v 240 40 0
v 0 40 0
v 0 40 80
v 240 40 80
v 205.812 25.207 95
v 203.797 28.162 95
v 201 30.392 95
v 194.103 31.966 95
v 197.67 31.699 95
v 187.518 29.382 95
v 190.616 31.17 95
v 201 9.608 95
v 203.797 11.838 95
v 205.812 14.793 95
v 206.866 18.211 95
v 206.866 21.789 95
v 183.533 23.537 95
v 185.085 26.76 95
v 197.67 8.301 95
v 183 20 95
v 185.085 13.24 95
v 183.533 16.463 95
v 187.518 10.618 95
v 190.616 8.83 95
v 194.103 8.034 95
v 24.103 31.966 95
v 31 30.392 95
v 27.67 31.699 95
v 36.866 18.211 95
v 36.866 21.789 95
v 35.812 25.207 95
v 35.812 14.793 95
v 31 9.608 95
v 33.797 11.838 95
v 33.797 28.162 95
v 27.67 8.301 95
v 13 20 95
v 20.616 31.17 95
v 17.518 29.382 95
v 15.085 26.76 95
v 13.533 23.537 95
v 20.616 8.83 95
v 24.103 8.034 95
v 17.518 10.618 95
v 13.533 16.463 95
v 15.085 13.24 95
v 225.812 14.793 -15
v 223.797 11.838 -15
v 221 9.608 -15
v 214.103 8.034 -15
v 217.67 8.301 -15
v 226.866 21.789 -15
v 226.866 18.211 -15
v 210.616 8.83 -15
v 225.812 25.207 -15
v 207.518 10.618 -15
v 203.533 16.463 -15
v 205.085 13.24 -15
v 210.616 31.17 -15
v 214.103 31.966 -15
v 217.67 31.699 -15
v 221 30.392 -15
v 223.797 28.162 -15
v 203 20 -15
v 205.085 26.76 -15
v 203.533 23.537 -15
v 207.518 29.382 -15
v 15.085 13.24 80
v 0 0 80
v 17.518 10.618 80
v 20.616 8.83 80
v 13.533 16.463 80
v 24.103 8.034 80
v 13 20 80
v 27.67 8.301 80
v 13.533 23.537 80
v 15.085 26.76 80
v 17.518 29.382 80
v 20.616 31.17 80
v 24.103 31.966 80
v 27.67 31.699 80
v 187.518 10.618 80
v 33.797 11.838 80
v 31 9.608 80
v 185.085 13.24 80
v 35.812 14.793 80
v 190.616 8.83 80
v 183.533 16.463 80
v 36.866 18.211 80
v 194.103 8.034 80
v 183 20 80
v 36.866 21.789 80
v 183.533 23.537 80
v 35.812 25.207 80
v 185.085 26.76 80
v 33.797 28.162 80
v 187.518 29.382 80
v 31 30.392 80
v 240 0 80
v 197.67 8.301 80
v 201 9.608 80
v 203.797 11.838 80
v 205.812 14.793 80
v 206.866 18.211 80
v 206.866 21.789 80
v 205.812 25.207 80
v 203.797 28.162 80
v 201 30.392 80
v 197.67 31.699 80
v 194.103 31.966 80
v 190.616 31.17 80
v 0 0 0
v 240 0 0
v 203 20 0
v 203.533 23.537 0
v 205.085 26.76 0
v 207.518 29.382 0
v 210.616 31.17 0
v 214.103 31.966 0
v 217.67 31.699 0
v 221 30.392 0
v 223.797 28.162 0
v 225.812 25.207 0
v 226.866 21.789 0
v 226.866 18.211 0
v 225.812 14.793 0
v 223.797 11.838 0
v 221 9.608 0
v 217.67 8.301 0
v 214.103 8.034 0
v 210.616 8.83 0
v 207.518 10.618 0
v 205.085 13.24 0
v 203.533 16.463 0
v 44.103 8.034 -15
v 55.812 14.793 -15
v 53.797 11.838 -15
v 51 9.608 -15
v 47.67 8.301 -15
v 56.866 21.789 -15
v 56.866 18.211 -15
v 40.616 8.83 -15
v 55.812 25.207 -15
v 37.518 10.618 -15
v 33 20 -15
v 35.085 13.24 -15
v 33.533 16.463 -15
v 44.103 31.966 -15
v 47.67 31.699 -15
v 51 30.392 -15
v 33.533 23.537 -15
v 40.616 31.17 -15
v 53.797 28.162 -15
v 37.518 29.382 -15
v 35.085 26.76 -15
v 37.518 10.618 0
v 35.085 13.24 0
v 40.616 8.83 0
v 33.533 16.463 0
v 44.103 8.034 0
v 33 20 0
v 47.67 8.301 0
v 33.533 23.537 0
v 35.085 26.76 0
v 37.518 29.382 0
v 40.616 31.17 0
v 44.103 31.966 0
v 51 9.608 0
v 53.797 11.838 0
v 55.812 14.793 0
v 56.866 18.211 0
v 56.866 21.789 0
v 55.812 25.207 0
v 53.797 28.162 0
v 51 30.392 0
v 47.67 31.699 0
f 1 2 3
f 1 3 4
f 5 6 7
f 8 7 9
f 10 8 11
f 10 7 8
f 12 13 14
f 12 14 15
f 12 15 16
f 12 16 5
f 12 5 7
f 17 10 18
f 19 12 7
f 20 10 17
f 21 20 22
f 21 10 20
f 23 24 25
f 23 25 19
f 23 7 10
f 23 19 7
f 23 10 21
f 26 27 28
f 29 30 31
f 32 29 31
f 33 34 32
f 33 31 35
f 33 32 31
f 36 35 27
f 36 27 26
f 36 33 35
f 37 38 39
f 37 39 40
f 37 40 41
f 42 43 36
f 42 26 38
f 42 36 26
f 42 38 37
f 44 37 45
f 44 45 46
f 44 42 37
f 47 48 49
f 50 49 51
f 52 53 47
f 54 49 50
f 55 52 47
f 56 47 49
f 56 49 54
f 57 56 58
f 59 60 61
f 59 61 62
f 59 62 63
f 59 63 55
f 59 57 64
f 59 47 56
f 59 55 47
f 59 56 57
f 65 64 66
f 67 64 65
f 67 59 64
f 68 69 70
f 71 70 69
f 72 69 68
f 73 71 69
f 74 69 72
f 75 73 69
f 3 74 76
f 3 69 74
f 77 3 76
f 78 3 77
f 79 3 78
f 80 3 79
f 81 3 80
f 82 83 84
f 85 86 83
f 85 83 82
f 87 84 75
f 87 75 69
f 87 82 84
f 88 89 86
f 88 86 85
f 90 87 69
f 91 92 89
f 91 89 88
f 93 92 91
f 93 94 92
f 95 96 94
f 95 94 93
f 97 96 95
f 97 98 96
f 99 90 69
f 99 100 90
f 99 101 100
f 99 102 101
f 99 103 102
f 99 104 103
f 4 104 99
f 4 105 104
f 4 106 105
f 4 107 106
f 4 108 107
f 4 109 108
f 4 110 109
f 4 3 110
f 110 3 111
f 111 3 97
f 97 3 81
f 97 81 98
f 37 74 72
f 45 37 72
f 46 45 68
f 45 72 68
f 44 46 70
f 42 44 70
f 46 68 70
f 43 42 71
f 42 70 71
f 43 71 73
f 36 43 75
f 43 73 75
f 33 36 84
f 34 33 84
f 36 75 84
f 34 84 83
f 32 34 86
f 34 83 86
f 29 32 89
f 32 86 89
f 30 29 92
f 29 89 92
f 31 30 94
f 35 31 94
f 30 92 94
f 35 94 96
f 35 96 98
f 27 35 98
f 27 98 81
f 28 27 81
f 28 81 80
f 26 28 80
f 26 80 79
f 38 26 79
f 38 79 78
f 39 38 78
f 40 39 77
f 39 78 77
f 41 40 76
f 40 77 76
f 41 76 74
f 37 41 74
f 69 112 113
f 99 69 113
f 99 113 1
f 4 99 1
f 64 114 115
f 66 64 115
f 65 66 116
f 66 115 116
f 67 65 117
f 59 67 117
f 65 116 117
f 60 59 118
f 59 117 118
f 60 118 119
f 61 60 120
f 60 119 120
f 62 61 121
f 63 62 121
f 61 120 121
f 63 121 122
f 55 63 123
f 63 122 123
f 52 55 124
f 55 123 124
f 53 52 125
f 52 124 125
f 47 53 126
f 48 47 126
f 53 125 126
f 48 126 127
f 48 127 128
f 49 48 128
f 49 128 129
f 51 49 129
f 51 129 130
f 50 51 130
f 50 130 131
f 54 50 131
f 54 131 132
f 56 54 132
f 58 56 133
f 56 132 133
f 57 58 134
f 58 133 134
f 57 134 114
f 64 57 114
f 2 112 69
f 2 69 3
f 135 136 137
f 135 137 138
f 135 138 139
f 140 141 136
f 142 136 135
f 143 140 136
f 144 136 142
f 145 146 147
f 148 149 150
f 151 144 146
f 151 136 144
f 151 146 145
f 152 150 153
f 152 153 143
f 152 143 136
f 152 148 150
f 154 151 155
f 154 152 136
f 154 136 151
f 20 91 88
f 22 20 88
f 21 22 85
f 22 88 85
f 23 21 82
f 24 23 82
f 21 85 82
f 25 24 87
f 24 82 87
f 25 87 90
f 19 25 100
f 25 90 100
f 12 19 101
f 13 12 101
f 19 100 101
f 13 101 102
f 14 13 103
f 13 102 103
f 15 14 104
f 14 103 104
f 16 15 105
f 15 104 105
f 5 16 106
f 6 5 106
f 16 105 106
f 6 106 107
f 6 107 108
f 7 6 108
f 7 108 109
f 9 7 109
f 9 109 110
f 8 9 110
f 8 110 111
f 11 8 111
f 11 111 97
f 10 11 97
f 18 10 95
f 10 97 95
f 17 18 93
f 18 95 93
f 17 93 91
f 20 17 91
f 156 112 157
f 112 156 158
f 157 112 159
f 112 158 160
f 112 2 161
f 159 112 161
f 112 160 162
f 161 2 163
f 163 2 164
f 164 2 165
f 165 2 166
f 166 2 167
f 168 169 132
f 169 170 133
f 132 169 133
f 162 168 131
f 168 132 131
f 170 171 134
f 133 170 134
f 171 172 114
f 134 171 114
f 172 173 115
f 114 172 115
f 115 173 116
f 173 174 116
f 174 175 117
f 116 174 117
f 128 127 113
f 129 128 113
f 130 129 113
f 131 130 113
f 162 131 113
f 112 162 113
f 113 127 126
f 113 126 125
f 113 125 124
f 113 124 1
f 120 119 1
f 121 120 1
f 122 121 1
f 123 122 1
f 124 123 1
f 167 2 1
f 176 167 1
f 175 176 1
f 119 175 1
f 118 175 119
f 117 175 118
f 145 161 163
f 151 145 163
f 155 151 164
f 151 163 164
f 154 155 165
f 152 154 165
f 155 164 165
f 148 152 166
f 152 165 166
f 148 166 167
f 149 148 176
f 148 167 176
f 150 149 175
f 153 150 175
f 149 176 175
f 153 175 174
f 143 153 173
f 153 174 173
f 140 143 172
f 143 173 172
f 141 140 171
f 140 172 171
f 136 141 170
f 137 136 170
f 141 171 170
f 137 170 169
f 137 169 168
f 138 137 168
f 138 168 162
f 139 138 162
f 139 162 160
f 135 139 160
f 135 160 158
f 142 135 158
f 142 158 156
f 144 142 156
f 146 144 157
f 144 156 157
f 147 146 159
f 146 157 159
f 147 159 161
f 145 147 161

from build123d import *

# Parameters (mm, degrees)
SKETCH_1_W      = 240
SKETCH_1_H      = 40
EXTRUDE_1_DEPTH = 80
SKETCH_2_R      = 12
EXTRUDE_2_DEPTH = 15
SKETCH_3_R      = 12
EXTRUDE_3_DEPTH = 15


with BuildPart() as part:
    # 草图1 → 凸台-拉伸1 (new body)
    with BuildSketch(Plane.XY):
        with Locations((120, 20)):
            Rectangle(SKETCH_1_W, SKETCH_1_H)
    extrude(amount=EXTRUDE_1_DEPTH)

    # 草图2 → 凸台-拉伸2 (add)
    with BuildSketch(Plane(origin=(0, 0, 0), x_dir=(-1, 0, 0), z_dir=(0, 0, -1))):
        with Locations((-215, 20)):
            Circle(SKETCH_2_R)
        with Locations((-45, 20)):
            Circle(SKETCH_2_R)
    extrude(amount=EXTRUDE_2_DEPTH)

    # 草图3 → 凸台-拉伸3 (add)
    with BuildSketch(Plane.XY.offset(80)):
        with Locations(Location((25, 20, 0), (0, 0, 180))):
            Circle(SKETCH_3_R)
        with Locations(Location((195, 20, 0), (0, 0, 180))):
            Circle(SKETCH_3_R)
    extrude(amount=EXTRUDE_3_DEPTH)


solid = part.part
